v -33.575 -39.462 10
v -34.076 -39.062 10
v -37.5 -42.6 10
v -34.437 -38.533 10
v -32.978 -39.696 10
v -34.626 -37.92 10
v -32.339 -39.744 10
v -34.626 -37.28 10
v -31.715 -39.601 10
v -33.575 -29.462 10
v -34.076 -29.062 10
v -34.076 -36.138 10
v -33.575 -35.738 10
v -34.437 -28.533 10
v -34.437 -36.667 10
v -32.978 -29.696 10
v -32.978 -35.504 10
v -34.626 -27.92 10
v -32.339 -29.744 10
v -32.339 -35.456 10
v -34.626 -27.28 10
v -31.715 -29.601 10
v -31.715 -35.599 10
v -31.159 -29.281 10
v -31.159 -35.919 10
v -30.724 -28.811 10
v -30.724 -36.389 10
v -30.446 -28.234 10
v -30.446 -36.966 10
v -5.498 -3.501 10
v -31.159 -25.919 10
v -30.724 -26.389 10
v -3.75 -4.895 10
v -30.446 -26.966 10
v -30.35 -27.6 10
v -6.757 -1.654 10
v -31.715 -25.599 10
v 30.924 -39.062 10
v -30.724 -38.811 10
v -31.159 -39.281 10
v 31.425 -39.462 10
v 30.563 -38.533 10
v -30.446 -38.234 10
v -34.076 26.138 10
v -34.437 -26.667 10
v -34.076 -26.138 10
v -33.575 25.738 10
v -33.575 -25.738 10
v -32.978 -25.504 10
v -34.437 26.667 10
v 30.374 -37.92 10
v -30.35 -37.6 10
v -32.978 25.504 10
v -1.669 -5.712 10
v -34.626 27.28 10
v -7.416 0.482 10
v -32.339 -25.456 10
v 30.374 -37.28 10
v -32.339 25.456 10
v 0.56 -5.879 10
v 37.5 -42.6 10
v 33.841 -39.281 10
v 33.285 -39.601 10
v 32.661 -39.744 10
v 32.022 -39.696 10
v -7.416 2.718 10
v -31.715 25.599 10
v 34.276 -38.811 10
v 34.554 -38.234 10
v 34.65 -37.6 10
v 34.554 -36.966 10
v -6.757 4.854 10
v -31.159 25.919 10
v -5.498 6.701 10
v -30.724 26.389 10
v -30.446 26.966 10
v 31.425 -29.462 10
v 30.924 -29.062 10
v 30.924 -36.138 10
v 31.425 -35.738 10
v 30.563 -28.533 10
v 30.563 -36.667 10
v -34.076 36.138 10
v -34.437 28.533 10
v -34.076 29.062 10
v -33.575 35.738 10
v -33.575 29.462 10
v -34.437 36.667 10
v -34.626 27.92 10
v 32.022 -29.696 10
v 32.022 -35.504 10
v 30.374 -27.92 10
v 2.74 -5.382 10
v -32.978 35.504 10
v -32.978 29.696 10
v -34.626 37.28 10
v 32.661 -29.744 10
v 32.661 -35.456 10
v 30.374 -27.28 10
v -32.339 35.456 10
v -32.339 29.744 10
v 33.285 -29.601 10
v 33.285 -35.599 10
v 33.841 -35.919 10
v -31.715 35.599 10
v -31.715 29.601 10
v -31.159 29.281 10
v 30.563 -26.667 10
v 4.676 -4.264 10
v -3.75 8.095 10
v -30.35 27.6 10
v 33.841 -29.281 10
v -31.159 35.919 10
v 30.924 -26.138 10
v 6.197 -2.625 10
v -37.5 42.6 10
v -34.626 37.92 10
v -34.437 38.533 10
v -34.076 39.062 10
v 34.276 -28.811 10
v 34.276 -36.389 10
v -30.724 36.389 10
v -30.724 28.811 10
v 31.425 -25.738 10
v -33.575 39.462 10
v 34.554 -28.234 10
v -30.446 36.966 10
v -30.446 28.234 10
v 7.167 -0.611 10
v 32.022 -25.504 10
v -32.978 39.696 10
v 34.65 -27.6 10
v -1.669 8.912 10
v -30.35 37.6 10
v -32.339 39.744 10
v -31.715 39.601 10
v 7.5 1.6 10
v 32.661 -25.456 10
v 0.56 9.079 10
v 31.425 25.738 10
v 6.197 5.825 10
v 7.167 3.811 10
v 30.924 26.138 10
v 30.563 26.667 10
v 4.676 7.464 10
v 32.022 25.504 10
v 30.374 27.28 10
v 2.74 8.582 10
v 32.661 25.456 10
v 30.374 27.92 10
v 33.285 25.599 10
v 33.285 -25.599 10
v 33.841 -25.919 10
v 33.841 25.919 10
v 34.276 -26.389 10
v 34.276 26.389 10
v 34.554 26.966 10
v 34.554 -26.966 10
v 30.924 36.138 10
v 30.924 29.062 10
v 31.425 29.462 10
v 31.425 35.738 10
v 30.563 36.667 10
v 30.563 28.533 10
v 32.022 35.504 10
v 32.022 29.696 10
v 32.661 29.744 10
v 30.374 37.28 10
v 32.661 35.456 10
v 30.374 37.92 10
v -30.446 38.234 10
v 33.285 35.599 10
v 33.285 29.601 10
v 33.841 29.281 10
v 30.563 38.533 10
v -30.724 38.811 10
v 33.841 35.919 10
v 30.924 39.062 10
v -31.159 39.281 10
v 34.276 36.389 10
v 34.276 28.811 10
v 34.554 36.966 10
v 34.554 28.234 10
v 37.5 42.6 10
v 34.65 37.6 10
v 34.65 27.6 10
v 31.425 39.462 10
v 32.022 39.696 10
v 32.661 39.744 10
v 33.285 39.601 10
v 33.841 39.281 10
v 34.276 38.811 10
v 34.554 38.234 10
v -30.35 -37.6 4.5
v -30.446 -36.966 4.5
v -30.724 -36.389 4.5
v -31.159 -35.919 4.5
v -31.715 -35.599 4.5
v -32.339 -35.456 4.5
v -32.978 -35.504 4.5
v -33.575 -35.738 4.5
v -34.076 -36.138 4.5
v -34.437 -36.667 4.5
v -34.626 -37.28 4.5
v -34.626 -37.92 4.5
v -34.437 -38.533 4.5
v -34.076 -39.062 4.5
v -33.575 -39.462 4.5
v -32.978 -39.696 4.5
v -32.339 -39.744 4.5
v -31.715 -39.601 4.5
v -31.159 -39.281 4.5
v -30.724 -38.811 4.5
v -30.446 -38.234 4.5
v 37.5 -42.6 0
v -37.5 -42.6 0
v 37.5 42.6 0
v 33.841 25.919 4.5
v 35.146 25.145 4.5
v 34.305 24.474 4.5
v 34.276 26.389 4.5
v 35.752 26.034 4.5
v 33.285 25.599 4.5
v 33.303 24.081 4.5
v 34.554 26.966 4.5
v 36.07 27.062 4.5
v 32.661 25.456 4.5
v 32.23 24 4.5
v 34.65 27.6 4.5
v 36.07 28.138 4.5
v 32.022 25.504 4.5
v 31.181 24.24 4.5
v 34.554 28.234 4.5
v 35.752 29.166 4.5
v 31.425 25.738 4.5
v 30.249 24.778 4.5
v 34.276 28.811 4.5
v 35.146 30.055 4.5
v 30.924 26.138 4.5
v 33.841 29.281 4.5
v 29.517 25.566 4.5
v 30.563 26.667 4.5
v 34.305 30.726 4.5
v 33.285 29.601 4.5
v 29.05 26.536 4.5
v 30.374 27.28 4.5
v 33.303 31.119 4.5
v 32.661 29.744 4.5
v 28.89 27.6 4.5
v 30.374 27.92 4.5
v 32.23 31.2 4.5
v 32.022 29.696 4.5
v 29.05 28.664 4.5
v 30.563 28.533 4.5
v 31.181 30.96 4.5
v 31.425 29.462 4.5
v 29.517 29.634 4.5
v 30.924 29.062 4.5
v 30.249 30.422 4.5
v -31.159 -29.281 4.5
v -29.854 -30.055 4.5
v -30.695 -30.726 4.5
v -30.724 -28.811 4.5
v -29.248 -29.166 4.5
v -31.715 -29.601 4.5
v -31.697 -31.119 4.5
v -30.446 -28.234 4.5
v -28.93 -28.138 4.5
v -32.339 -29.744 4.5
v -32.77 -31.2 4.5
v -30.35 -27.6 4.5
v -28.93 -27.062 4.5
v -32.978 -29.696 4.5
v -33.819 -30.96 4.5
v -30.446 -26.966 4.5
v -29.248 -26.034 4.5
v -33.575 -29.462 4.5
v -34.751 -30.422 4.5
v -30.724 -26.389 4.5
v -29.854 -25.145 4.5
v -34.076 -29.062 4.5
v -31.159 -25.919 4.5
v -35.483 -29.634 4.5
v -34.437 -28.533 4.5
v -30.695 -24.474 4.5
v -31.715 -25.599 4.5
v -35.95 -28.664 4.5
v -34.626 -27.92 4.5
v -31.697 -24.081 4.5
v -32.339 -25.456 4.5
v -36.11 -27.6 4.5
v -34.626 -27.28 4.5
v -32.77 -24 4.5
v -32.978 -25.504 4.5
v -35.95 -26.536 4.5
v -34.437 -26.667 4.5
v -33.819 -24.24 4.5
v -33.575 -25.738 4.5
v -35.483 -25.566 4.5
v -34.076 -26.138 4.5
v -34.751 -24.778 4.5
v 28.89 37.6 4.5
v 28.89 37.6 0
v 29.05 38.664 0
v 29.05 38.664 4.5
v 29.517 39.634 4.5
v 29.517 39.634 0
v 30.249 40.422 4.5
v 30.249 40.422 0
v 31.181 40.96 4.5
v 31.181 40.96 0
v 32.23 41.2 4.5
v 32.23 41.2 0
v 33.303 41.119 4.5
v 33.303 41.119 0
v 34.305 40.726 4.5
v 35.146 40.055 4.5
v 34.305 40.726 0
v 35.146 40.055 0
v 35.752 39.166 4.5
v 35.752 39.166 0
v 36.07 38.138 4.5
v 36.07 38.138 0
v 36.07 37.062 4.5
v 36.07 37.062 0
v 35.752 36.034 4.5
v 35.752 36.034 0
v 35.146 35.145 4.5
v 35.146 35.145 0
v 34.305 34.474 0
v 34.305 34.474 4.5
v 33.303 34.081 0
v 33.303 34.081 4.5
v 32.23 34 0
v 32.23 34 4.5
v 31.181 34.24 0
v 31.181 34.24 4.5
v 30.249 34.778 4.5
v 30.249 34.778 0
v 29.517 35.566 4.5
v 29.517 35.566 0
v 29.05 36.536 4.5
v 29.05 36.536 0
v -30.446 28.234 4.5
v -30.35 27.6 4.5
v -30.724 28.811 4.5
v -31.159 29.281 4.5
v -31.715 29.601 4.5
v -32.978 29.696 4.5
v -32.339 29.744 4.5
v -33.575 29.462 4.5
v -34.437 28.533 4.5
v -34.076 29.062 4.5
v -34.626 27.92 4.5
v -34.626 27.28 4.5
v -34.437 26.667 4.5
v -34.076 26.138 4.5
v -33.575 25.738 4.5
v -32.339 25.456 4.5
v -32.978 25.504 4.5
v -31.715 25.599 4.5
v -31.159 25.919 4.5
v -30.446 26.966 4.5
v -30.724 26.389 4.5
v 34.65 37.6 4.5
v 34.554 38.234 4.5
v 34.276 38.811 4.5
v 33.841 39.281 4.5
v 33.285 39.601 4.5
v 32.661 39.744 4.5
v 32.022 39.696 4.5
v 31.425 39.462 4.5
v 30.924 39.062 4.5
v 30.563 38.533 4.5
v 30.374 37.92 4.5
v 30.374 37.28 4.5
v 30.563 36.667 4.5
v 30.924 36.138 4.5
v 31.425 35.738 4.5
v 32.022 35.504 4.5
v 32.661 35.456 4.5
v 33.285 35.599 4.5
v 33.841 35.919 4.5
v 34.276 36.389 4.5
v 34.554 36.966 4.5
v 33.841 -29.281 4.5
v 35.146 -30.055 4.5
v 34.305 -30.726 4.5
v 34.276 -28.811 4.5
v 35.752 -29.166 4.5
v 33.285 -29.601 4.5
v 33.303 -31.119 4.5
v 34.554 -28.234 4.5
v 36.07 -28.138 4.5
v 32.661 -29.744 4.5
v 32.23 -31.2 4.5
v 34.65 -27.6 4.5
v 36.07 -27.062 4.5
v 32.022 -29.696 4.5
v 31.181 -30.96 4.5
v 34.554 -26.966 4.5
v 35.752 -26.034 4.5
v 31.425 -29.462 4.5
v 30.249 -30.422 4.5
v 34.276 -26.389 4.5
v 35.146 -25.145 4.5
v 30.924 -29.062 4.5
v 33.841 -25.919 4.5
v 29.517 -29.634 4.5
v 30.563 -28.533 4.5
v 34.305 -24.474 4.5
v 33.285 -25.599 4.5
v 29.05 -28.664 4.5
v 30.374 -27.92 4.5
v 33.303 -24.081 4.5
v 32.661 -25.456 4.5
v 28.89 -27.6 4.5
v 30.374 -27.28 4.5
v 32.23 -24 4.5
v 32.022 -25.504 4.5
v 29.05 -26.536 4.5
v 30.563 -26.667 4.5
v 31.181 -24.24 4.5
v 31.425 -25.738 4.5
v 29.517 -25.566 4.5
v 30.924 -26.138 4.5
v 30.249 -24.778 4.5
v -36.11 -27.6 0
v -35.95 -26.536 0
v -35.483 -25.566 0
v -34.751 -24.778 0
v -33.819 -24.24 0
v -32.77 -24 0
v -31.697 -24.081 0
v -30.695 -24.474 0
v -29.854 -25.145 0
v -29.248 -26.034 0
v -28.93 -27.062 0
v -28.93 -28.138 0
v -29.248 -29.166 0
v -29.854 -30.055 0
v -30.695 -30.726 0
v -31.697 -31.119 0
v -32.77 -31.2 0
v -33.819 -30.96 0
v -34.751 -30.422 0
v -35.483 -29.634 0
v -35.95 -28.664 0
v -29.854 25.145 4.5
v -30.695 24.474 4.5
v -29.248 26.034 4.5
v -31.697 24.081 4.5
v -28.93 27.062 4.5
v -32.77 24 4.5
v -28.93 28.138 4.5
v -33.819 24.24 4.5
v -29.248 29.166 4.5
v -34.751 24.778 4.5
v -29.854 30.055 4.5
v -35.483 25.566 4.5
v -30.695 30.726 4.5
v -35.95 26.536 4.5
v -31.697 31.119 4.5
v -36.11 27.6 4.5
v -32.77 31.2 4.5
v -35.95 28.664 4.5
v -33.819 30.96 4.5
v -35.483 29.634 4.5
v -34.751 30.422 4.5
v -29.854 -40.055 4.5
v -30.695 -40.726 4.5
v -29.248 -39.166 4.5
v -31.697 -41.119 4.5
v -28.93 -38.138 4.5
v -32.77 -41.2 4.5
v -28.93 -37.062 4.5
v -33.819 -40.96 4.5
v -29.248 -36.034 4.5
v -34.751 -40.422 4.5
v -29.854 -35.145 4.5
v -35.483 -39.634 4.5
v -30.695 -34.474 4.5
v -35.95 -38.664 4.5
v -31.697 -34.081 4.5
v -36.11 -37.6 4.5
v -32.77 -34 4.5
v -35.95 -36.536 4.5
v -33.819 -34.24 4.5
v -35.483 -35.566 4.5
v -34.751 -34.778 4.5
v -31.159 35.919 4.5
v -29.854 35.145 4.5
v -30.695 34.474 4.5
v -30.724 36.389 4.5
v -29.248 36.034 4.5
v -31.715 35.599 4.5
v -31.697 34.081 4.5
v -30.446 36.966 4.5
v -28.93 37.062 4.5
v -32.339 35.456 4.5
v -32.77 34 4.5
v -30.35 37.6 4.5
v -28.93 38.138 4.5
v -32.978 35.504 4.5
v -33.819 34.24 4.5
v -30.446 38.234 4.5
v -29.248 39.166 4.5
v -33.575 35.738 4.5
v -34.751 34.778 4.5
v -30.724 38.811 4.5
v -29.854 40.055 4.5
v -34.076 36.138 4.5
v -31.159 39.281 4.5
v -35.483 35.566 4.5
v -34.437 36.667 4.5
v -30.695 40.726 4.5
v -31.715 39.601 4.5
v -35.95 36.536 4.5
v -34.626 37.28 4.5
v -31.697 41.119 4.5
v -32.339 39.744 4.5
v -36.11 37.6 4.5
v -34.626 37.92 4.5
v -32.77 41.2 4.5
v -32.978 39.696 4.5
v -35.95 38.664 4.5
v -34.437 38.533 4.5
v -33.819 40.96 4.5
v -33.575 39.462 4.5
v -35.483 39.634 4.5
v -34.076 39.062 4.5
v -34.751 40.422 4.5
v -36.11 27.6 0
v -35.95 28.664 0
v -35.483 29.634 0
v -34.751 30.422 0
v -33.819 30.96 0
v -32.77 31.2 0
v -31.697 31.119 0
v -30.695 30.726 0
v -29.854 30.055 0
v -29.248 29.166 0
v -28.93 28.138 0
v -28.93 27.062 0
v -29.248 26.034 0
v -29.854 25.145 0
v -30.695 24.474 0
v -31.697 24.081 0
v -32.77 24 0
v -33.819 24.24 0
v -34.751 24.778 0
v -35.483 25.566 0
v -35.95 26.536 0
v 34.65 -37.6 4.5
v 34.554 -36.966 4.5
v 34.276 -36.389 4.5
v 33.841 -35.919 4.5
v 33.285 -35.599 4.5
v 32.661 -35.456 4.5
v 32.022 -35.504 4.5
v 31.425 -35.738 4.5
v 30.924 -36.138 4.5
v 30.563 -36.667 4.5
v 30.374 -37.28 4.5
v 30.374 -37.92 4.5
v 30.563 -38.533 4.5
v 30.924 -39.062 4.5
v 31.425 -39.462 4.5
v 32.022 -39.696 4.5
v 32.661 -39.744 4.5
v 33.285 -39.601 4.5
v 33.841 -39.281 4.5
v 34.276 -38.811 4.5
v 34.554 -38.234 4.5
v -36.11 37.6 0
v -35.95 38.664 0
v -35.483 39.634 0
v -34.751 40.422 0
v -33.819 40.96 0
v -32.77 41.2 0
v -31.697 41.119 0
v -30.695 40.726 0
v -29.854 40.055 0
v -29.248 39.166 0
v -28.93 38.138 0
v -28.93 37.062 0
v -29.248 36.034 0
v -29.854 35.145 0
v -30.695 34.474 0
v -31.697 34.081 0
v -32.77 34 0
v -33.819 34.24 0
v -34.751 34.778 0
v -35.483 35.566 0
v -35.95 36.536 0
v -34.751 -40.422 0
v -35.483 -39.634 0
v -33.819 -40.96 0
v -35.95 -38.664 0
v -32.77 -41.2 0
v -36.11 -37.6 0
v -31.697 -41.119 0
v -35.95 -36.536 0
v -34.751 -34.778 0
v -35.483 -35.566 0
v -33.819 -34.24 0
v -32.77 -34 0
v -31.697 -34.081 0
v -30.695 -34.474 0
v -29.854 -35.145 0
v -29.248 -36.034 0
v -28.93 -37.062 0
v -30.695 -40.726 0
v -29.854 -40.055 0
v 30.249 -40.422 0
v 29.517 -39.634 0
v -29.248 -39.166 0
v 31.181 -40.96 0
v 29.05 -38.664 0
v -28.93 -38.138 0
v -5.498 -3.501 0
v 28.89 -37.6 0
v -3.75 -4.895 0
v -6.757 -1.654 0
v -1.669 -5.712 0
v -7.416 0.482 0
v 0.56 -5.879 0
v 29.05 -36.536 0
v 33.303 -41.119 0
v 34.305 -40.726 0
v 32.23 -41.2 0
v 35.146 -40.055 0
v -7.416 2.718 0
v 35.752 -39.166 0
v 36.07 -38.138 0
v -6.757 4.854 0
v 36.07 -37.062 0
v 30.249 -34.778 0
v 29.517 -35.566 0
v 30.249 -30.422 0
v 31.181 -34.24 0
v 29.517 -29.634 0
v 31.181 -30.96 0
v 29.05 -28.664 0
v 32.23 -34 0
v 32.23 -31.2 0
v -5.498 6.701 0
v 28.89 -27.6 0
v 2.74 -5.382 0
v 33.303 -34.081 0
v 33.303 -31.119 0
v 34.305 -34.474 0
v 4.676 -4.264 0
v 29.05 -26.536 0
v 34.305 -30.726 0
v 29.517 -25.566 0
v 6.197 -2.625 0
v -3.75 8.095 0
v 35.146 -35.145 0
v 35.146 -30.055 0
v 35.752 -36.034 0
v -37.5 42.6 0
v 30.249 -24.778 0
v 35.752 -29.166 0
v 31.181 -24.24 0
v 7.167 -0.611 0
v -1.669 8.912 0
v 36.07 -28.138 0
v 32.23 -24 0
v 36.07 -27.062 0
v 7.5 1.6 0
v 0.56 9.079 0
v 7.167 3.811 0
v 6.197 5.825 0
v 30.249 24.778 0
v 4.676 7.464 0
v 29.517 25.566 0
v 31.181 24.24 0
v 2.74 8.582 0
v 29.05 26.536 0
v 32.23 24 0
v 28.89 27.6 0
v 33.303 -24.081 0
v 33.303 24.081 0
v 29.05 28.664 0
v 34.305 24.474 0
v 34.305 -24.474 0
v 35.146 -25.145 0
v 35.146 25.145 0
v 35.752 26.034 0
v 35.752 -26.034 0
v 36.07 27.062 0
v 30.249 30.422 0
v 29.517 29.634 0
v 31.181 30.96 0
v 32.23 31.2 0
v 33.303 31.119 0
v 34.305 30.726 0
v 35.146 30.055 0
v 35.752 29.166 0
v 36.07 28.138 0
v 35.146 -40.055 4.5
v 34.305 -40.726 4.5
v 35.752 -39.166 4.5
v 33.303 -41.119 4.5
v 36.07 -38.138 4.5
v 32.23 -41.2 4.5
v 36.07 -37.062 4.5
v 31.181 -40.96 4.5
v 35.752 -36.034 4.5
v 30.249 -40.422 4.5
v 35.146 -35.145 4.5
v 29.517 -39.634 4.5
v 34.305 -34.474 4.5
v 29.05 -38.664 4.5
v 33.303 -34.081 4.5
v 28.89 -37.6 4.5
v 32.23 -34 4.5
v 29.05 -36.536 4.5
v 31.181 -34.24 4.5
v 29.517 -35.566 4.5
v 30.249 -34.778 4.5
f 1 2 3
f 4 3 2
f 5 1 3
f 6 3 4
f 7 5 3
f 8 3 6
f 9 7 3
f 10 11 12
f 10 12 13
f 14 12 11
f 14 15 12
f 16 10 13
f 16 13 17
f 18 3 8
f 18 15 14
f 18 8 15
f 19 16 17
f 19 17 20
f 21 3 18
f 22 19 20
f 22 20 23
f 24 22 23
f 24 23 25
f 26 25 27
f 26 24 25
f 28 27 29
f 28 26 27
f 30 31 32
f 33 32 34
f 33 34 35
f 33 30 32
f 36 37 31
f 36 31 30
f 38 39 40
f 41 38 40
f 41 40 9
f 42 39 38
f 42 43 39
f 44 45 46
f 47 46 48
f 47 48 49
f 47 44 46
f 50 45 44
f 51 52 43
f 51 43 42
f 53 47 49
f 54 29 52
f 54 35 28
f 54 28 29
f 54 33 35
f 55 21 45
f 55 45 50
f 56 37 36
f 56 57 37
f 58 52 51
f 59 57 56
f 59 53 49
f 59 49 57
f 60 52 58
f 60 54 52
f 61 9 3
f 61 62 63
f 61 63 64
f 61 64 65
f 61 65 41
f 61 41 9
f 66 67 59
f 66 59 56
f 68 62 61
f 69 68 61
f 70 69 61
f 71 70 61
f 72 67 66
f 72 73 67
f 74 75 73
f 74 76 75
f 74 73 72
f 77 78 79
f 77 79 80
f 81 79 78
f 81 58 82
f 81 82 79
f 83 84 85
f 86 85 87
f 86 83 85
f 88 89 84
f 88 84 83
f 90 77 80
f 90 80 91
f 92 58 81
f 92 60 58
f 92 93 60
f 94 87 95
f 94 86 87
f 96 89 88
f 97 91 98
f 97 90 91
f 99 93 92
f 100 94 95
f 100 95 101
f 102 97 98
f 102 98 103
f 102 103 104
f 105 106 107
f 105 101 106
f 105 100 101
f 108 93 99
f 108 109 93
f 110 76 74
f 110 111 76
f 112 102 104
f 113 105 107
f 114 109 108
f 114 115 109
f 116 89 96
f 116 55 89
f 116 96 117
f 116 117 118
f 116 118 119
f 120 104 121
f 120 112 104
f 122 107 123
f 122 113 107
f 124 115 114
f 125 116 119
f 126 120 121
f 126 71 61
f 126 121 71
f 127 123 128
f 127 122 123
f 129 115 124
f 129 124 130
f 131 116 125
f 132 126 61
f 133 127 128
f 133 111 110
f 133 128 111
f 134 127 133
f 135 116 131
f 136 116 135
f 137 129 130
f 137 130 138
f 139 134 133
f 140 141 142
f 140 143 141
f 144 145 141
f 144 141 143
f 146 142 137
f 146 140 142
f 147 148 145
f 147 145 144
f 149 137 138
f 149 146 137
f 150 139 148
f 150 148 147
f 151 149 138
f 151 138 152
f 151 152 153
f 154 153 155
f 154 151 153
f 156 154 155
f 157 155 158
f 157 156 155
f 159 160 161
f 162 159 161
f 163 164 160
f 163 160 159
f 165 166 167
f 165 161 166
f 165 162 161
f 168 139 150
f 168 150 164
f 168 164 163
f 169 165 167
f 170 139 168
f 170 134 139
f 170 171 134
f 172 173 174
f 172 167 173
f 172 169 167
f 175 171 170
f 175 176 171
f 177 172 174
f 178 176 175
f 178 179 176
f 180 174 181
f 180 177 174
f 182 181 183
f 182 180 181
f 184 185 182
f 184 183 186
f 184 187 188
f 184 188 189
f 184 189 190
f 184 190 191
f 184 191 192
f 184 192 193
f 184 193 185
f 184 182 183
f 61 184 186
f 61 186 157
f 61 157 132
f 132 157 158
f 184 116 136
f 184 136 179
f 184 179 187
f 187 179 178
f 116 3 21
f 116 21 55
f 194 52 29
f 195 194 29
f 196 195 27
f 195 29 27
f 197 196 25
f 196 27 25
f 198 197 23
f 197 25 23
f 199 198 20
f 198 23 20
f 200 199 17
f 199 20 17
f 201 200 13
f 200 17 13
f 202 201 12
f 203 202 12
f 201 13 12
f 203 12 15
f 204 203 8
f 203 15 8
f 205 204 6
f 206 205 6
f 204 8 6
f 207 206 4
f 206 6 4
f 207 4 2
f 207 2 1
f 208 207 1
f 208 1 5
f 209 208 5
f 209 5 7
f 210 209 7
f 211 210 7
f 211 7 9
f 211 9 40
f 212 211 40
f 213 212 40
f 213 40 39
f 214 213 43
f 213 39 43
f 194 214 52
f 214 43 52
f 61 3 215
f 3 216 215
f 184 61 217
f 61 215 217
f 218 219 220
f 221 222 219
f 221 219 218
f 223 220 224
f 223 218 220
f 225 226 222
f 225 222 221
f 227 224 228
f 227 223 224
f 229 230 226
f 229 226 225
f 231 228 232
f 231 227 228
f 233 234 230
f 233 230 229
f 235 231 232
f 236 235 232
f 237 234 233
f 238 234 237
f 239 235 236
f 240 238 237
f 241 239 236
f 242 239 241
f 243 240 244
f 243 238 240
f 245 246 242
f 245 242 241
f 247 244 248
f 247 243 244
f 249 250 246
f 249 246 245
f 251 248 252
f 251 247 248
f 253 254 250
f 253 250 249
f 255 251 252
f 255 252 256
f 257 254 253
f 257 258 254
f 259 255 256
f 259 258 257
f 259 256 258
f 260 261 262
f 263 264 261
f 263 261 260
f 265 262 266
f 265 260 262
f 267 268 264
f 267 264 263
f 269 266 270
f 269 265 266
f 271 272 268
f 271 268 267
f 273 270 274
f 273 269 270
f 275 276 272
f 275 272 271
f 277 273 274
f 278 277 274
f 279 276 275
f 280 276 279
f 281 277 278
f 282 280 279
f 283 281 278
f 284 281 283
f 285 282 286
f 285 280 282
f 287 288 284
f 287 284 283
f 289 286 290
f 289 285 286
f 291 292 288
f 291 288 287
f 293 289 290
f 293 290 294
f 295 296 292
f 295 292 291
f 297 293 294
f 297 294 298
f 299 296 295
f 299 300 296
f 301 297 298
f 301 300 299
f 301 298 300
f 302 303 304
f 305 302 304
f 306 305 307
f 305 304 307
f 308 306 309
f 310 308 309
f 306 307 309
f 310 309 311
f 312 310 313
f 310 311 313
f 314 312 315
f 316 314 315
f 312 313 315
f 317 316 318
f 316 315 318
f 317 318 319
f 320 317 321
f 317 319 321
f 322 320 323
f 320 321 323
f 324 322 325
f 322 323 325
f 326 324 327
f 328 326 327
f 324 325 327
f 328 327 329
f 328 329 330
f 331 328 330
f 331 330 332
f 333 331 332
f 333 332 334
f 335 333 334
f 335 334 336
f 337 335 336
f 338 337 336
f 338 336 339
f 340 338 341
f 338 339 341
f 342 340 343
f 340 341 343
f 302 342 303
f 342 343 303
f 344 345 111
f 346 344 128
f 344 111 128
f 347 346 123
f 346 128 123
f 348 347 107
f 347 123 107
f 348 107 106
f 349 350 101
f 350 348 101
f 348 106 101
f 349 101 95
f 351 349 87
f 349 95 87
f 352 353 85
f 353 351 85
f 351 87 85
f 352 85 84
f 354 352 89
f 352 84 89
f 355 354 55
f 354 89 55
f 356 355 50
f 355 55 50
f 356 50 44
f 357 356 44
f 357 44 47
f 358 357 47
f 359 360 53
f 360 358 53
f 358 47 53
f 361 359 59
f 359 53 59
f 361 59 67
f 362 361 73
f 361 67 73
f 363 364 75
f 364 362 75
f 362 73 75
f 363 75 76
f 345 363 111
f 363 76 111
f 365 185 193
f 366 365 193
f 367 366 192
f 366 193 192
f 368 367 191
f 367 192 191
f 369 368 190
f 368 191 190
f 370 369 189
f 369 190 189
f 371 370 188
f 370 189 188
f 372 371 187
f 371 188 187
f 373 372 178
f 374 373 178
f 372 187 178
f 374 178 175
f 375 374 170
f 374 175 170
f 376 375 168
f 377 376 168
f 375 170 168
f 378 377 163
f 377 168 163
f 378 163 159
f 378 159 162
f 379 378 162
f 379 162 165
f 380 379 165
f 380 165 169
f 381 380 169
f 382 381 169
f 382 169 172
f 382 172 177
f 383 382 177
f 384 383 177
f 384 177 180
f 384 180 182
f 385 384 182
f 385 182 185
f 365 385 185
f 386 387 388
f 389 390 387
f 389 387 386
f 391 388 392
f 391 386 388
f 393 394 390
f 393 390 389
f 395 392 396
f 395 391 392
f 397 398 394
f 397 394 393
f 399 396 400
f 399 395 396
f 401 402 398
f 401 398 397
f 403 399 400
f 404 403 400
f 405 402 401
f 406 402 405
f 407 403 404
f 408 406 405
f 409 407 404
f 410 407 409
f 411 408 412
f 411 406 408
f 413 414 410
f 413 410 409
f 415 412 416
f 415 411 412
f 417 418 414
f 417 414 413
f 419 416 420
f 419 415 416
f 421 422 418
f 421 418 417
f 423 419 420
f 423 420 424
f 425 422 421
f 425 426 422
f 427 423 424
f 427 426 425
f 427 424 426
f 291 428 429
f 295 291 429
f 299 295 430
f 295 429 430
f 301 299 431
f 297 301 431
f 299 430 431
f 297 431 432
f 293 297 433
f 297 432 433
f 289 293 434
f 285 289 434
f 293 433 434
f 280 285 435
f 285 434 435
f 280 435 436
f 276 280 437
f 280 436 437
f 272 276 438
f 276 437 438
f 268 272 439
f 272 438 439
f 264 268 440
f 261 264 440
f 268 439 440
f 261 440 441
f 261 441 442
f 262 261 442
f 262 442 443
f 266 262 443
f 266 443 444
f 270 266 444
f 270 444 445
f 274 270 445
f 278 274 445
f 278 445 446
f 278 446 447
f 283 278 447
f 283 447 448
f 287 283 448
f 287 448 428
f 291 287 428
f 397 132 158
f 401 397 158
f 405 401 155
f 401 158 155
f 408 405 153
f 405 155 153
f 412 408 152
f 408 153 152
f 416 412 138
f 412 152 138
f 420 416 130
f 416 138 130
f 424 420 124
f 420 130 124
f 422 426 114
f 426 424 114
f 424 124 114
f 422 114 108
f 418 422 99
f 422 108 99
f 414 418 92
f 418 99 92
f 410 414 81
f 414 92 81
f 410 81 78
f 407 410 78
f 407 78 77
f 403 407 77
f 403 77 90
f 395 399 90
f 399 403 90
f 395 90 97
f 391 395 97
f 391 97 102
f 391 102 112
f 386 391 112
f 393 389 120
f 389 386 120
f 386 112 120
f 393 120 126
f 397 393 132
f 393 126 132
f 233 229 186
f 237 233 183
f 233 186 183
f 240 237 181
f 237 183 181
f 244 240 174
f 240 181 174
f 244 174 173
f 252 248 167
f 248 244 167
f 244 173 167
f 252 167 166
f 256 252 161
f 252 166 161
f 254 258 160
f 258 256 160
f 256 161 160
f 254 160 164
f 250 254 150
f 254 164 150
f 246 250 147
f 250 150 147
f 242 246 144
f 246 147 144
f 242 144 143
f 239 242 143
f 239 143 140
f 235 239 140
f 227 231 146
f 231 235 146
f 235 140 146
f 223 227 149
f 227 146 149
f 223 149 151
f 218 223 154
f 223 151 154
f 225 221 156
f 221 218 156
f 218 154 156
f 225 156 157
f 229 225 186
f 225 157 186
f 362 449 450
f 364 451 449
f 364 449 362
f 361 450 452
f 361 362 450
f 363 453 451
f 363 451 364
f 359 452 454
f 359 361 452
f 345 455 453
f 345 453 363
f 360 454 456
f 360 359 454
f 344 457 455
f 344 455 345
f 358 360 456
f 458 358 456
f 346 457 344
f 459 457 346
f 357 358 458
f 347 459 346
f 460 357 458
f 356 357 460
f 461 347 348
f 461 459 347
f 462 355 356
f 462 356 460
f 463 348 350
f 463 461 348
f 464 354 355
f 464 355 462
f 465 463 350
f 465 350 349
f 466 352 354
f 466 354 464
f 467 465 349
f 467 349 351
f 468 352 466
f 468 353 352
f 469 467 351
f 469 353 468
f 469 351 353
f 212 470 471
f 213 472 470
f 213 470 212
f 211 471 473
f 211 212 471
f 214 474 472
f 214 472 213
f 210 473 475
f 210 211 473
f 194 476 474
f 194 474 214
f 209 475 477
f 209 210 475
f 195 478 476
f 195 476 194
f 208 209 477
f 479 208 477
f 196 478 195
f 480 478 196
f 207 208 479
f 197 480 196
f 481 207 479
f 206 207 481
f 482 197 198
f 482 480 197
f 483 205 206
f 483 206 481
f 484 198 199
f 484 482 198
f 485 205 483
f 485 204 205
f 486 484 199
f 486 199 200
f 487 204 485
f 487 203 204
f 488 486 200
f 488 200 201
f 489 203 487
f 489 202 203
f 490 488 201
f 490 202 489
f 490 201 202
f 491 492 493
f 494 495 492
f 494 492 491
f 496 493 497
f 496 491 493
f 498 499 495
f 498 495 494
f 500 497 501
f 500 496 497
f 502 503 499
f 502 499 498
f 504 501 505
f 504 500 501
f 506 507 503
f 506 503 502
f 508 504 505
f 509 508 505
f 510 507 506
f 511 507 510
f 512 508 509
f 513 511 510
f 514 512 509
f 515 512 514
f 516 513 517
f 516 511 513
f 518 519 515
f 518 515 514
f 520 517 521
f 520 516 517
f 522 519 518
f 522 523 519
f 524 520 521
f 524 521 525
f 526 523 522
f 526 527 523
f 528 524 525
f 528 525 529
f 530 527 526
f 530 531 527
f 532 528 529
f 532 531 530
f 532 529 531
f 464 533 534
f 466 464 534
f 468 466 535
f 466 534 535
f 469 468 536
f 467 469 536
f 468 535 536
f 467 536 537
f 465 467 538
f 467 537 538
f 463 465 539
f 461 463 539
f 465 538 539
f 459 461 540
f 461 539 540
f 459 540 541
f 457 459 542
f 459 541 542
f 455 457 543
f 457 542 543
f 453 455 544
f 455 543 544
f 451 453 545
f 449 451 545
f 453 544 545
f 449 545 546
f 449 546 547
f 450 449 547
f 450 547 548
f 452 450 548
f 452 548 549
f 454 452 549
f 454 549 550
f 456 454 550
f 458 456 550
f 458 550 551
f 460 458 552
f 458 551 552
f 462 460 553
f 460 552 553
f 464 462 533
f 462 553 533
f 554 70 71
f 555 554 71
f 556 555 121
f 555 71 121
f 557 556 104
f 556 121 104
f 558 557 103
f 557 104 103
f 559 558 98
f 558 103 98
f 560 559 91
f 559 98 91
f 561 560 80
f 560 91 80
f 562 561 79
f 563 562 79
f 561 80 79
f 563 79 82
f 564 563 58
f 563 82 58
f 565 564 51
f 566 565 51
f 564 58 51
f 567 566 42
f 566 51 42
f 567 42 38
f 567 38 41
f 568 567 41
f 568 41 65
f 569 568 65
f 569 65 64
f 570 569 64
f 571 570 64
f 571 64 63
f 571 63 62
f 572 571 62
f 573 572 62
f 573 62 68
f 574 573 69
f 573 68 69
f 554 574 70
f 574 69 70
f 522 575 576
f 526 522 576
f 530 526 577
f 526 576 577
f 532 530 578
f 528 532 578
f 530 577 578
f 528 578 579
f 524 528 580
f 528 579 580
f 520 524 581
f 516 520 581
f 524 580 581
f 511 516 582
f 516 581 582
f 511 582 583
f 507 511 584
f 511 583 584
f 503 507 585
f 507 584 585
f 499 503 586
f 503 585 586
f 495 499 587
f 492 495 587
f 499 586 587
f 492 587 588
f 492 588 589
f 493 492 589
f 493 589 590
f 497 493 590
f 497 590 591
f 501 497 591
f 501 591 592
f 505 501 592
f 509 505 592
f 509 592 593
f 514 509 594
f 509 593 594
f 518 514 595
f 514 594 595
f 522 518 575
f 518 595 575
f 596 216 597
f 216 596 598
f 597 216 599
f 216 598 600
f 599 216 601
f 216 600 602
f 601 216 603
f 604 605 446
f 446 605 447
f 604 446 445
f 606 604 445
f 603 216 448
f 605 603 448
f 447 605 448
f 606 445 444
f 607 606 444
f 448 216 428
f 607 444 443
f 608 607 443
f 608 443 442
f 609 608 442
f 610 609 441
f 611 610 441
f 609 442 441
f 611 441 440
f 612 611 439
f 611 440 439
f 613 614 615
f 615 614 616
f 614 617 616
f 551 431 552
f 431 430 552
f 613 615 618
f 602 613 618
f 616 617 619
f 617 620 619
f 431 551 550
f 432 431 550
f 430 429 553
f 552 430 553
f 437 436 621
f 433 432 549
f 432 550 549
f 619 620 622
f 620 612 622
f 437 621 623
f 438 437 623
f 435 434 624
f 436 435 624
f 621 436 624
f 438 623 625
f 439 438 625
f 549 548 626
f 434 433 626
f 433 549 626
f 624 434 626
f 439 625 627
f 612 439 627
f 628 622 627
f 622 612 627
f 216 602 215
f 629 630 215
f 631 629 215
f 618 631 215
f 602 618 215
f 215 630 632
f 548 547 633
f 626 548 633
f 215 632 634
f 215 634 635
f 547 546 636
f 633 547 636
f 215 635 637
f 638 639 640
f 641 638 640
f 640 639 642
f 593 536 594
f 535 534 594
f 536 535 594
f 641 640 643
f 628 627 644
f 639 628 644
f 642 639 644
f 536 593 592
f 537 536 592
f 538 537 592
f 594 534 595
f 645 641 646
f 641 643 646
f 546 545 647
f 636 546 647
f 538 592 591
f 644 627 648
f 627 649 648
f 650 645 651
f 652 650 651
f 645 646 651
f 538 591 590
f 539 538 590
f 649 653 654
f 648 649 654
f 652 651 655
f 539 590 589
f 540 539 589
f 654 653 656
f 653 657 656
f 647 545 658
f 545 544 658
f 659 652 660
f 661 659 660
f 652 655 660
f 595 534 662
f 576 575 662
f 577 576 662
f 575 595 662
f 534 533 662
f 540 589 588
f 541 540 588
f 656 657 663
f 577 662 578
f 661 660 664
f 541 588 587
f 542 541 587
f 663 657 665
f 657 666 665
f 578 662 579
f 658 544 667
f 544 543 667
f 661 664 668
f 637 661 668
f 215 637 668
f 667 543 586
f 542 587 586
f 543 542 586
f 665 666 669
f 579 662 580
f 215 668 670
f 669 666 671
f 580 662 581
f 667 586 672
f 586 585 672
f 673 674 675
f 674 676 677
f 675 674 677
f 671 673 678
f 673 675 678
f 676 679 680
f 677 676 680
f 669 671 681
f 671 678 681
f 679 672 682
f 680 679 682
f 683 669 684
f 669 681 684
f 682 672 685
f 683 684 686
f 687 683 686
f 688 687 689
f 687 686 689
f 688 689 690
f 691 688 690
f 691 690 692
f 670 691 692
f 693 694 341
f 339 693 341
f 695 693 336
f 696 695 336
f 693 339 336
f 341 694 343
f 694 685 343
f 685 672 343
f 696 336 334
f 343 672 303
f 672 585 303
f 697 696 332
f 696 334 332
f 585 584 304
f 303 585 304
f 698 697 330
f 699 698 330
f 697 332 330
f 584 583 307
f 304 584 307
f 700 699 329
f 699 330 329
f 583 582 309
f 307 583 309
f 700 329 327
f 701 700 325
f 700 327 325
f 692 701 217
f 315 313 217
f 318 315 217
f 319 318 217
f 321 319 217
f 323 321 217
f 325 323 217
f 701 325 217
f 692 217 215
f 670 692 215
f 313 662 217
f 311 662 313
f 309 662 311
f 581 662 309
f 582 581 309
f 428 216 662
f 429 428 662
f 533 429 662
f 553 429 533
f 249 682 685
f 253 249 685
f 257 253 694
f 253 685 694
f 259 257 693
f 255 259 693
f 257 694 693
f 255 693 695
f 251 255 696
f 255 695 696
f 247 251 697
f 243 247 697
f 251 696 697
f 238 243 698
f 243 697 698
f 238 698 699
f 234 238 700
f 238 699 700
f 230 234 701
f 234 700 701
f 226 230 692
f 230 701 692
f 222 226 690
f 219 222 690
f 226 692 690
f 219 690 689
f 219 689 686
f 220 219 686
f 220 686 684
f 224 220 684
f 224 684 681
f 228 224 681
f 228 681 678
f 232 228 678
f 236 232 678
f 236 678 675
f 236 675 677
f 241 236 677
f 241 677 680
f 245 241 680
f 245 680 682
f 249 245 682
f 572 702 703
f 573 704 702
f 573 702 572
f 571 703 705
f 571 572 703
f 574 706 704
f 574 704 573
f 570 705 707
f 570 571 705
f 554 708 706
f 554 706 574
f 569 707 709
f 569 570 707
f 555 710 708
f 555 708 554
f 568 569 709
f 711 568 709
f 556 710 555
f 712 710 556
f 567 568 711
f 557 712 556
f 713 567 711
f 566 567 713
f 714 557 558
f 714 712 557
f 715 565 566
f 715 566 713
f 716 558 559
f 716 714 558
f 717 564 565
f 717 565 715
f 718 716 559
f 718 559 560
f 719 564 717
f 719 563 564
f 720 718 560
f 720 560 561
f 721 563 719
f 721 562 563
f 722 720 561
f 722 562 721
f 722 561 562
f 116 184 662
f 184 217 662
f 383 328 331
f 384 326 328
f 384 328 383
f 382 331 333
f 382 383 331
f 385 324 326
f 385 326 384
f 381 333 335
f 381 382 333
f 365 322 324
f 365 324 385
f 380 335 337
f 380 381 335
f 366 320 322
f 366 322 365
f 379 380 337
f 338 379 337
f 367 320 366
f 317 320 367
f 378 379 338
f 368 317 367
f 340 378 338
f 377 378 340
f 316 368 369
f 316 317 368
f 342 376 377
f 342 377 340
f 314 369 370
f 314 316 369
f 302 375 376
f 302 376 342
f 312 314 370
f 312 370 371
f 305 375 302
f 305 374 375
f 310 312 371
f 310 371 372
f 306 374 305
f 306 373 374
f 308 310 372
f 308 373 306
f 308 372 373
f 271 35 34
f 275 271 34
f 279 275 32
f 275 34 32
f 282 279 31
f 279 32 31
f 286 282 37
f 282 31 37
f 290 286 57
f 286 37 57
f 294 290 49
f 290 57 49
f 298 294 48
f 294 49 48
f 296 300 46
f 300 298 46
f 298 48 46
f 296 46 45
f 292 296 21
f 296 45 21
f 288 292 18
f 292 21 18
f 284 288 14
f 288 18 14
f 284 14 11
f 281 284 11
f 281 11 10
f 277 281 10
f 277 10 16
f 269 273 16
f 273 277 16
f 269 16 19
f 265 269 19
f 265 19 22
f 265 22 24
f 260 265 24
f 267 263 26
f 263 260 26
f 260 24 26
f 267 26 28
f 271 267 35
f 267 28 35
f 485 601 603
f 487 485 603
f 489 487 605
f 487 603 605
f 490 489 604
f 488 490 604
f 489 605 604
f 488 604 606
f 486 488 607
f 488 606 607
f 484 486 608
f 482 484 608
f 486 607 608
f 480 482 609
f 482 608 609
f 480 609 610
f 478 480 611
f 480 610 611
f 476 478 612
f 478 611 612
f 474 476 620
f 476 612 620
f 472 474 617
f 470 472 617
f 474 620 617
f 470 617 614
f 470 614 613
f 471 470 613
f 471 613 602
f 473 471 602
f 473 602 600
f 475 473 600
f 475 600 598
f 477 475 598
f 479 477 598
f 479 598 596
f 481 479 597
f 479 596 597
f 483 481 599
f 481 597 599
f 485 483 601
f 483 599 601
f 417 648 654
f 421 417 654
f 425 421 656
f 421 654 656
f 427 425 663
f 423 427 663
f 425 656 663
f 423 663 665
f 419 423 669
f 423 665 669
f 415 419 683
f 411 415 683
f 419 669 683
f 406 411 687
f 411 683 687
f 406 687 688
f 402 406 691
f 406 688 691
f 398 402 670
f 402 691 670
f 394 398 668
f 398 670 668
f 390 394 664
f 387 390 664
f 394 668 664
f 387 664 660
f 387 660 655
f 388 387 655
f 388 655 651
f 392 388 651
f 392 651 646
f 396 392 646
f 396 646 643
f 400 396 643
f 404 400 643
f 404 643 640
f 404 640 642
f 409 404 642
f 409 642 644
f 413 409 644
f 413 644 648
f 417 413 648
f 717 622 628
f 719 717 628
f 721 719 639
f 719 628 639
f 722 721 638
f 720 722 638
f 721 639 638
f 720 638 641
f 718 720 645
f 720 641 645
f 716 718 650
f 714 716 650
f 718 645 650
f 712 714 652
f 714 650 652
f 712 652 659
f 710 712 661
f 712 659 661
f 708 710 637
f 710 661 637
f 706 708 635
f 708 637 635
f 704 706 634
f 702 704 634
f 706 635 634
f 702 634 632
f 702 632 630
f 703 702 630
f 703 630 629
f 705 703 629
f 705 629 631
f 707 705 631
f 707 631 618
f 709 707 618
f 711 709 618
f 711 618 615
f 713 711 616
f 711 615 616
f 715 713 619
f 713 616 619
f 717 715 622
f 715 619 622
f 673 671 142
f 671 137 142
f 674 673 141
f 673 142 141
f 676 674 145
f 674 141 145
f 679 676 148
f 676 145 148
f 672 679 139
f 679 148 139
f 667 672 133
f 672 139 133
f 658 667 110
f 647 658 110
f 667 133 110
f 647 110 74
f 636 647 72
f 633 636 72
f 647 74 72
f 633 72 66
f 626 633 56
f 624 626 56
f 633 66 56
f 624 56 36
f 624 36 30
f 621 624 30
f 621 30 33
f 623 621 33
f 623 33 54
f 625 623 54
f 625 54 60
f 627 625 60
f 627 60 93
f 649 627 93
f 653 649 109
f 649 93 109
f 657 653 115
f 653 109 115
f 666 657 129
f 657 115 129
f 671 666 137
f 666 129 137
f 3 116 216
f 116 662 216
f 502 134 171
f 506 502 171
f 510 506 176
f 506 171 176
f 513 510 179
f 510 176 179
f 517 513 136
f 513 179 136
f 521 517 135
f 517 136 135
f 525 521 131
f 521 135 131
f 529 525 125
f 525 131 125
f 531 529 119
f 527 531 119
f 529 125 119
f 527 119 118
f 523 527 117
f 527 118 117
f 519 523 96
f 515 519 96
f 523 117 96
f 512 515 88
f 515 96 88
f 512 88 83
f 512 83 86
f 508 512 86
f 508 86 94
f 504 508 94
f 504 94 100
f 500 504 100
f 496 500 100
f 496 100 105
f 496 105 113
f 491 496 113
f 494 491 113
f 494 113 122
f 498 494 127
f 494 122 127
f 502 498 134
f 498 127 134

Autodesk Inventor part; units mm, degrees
ref_plane "YZ Plane" through (0, 0, 0) normal (1, 0, 0) x (0, 1, 0)
ref_plane "XZ Plane" through (0, 0, 0) normal (0, 1, 0) x (-1, 0, 0)
ref_plane "XY Plane" through (0, 0, 0) normal (0, 0, 1) x (1, 0, 0)
sketch "Sketch1" plane through (0, 0, 0) normal (0, 0, 1) x (1, 0, 0)
  line L0 (-37.5, -42.6) -> (37.5, -42.6)
  line L1 (37.5, -42.6) -> (37.5, 42.6)
  line L2 (37.5, 42.6) -> (-37.5, 42.6)
  line L3 (-37.5, 42.6) -> (-37.5, -42.6)
  line L4 (-37.5, -42.6) -> (37.5, 42.6) construction
  line L5 (37.5, -42.6) -> (-37.5, 42.6) construction
  point P0 (0, 0)
  dimension "d0" = 75
  dimension "d1" = 85.2
extrude "Extrusion1" add sketch "Sketch1" along normal blind 10
sketch "Sketch4" plane through (0, 0, 10) normal (0, 0, 1) x (1, 0, 0)
  point P0 (0, 0)
sketch "Sketch5" plane through (0, 0, 10) normal (0, 0, 1) x (1, 0, 0)
  line L0 (-37.5, -42.6) -> (37.5, -42.6) projected
  line L1 (0, -42.6) -> (0, 1.6)
  circle A0 centre (0, 1.6) radius 7.5
  line L2 (0, 1.6) -> (13, 1.6)
  point P0 (0, 0)
  dimension "d21" = 44.2
  dimension "d22" = 15
extrude "Extrusion6" cut sketch "Sketch5" against normal blind 10
sketch "Sketch6" plane through (0, 0, 10) normal (0, 0, 1) x (1, 0, 0)
  circle A0 centre (13, 6.6) radius 3.75 projected
sketch "Boceto8" plane through (0, 0, 10) normal (0, 0, 1) x (1, 0, 0)
  circle A0 centre (-9.5, 7.6) radius 2.5 projected
sketch "Boceto9" plane through (0, 0, 0) normal (0, 0, -1) x (-1, 0, 0)
  circle A0 centre (9.5, 7.6) radius 2.5 projected
sketch "Boceto10" plane through (0, 0, 10) normal (0, 0, 1) x (1, 0, 0)
  circle A0 centre (-9.5, 7.6) radius 2.5 projected
sketch "Boceto11" plane through (0, 0, 0) normal (0, 0, -1) x (-1, 0, 0)
  circle A0 centre (9.5, 7.6) radius 2.5 projected
sketch "Sketch12" plane through (0, 0, 10) normal (0, 0, 1) x (1, 0, 0)
  point P0 (0, 0)
sketch "Sketch15" plane through (0, 0, 0) normal (0, 0, -1) x (-1, 0, 0)
  circle A0 centre (32.5, 37.6) radius 2 projected
  circle A1 centre (32.5, 37.6) radius 3.61
  line L0 (-37.5, 42.6) -> (37.5, 42.6) projected
  line L1 (0, 42.6) -> (0, 0)
  line L2 (-37.5, -42.6) -> (-37.5, 42.6) projected
  line L3 (-37.5, 0) -> (37.5, 0)
  circle A2 centre (-32.5, 37.6) radius 2
  circle A3 centre (-32.5, 37.6) radius 3.61
  circle A4 centre (32.5, -37.6) radius 2
  circle A5 centre (32.5, -37.6) radius 3.61
  circle A6 centre (-32.5, -37.6) radius 2
  circle A7 centre (-32.5, -37.6) radius 3.61
  point P0 (0, -42.6)
  dimension "d52" = 7.22
extrude "Extrusion10" cut sketch "Sketch15" against normal blind 4.5 contours A0 | A1 | A3 | A4 | A5 | A6 | A7
sketch "Sketch13" plane through (0, 0, 10) normal (0, 0, 1) x (1, 0, 0)
  line L0 (37.5, -42.6) -> (37.5, 42.6) projected
  line L1 (37.5, -42.6) -> (32.5, -42.6)
  line L2 (-37.5, -42.6) -> (37.5, -42.6) projected
  line L3 (32.5, -42.6) -> (32.5, -37.6)
  circle A0 centre (32.5, -37.6) radius 2.15
  circle A1 centre (32.5, -37.6) radius 3.61
  line L4 (0, 0) -> (0, -42.6)
  line L5 (-37.5, 42.6) -> (-37.5, -42.6) projected
  line L6 (-37.5, 0) -> (37.5, 0)
  line L7 (-32.5, -42.6) -> (-32.5, -37.6)
  circle A2 centre (-32.5, -37.6) radius 2.15
  circle A3 centre (-32.5, -37.6) radius 3.61
  line L8 (37.5, 42.6) -> (32.5, 42.6)
  line L9 (-37.5, 42.6) -> (37.5, 42.6)
  line L10 (32.5, 42.6) -> (32.5, 37.6)
  circle A4 centre (32.5, 37.6) radius 2.15
  circle A5 centre (32.5, 37.6) radius 3.61
  line L11 (-32.5, 42.6) -> (-32.5, 37.6)
  circle A6 centre (-32.5, 37.6) radius 2.15
  circle A7 centre (-32.5, 37.6) radius 3.61
  line L12 (32.5, -37.6) -> (32.5, -27.6)
  circle A8 centre (32.5, -27.6) radius 2.15
  circle A9 centre (32.5, -27.6) radius 3.61
  line L13 (-37.5, -42.6) -> (-37.5, 42.6)
  line L14 (-37.5, -42.6) -> (-32.5, -42.6)
  line L15 (37.5, -42.6) -> (-37.5, -42.6)
  line L16 (-32.5, -42.6) -> (-32.5, -37.6)
  circle A10 centre (-32.5, -37.6) radius 2.15
  circle A11 centre (-32.5, -37.6) radius 3.61
  line L17 (-32.5, -37.6) -> (-32.5, -27.6)
  circle A12 centre (-32.5, -27.6) radius 2.15
  circle A13 centre (-32.5, -27.6) radius 3.61
  circle A14 centre (32.5, 27.6) radius 2.15
  circle A15 centre (32.5, 27.6) radius 3.61
  circle A16 centre (-32.5, 27.6) radius 2.15
  circle A17 centre (-32.5, 27.6) radius 3.61
  point P0 (0, 42.6)
  dimension "d43" = 5
  dimension "d44" = 5
  dimension "d45" = 4.3
  dimension "d46" = 7.22
  dimension "d55" = 10
  dimension "d56" = 4.3
  dimension "d57" = 7.22
extrude "Extrusion11" cut sketch "Sketch13" against normal blind 10 contours A8 | A4 | A6 | A12 | A0 L12 L3 | L3 L12 A0 | A2 L17 L7 | L7 L17 A2 | A14 | A16
sketch "Sketch16" plane through (0, 0, 0) normal (0, 0, -1) x (-1, 0, 0)
  circle A0 centre (-32.5, 27.6) radius 2.15 projected
  circle A1 centre (-32.5, 27.6) radius 3.61
  circle A2 centre (32.5, 27.6) radius 2.15 projected
  circle A3 centre (32.5, 27.6) radius 3.61
  circle A4 centre (-32.5, -27.6) radius 2.15 projected
  circle A5 centre (-32.5, -27.6) radius 3.61
  circle A6 centre (32.5, -27.6) radius 2.15 projected
  circle A7 centre (32.5, -27.6) radius 3.61
  point P0 (0, 0)
  dimension "d60" = 7.22
  dimension "d61" = 7.22
  dimension "d62" = 7.22
  dimension "d63" = 7.22
extrude "Extrusion12" cut sketch "Sketch16" against normal blind 4.5
properties part number "Rb PEEK - Corto con ventana"
